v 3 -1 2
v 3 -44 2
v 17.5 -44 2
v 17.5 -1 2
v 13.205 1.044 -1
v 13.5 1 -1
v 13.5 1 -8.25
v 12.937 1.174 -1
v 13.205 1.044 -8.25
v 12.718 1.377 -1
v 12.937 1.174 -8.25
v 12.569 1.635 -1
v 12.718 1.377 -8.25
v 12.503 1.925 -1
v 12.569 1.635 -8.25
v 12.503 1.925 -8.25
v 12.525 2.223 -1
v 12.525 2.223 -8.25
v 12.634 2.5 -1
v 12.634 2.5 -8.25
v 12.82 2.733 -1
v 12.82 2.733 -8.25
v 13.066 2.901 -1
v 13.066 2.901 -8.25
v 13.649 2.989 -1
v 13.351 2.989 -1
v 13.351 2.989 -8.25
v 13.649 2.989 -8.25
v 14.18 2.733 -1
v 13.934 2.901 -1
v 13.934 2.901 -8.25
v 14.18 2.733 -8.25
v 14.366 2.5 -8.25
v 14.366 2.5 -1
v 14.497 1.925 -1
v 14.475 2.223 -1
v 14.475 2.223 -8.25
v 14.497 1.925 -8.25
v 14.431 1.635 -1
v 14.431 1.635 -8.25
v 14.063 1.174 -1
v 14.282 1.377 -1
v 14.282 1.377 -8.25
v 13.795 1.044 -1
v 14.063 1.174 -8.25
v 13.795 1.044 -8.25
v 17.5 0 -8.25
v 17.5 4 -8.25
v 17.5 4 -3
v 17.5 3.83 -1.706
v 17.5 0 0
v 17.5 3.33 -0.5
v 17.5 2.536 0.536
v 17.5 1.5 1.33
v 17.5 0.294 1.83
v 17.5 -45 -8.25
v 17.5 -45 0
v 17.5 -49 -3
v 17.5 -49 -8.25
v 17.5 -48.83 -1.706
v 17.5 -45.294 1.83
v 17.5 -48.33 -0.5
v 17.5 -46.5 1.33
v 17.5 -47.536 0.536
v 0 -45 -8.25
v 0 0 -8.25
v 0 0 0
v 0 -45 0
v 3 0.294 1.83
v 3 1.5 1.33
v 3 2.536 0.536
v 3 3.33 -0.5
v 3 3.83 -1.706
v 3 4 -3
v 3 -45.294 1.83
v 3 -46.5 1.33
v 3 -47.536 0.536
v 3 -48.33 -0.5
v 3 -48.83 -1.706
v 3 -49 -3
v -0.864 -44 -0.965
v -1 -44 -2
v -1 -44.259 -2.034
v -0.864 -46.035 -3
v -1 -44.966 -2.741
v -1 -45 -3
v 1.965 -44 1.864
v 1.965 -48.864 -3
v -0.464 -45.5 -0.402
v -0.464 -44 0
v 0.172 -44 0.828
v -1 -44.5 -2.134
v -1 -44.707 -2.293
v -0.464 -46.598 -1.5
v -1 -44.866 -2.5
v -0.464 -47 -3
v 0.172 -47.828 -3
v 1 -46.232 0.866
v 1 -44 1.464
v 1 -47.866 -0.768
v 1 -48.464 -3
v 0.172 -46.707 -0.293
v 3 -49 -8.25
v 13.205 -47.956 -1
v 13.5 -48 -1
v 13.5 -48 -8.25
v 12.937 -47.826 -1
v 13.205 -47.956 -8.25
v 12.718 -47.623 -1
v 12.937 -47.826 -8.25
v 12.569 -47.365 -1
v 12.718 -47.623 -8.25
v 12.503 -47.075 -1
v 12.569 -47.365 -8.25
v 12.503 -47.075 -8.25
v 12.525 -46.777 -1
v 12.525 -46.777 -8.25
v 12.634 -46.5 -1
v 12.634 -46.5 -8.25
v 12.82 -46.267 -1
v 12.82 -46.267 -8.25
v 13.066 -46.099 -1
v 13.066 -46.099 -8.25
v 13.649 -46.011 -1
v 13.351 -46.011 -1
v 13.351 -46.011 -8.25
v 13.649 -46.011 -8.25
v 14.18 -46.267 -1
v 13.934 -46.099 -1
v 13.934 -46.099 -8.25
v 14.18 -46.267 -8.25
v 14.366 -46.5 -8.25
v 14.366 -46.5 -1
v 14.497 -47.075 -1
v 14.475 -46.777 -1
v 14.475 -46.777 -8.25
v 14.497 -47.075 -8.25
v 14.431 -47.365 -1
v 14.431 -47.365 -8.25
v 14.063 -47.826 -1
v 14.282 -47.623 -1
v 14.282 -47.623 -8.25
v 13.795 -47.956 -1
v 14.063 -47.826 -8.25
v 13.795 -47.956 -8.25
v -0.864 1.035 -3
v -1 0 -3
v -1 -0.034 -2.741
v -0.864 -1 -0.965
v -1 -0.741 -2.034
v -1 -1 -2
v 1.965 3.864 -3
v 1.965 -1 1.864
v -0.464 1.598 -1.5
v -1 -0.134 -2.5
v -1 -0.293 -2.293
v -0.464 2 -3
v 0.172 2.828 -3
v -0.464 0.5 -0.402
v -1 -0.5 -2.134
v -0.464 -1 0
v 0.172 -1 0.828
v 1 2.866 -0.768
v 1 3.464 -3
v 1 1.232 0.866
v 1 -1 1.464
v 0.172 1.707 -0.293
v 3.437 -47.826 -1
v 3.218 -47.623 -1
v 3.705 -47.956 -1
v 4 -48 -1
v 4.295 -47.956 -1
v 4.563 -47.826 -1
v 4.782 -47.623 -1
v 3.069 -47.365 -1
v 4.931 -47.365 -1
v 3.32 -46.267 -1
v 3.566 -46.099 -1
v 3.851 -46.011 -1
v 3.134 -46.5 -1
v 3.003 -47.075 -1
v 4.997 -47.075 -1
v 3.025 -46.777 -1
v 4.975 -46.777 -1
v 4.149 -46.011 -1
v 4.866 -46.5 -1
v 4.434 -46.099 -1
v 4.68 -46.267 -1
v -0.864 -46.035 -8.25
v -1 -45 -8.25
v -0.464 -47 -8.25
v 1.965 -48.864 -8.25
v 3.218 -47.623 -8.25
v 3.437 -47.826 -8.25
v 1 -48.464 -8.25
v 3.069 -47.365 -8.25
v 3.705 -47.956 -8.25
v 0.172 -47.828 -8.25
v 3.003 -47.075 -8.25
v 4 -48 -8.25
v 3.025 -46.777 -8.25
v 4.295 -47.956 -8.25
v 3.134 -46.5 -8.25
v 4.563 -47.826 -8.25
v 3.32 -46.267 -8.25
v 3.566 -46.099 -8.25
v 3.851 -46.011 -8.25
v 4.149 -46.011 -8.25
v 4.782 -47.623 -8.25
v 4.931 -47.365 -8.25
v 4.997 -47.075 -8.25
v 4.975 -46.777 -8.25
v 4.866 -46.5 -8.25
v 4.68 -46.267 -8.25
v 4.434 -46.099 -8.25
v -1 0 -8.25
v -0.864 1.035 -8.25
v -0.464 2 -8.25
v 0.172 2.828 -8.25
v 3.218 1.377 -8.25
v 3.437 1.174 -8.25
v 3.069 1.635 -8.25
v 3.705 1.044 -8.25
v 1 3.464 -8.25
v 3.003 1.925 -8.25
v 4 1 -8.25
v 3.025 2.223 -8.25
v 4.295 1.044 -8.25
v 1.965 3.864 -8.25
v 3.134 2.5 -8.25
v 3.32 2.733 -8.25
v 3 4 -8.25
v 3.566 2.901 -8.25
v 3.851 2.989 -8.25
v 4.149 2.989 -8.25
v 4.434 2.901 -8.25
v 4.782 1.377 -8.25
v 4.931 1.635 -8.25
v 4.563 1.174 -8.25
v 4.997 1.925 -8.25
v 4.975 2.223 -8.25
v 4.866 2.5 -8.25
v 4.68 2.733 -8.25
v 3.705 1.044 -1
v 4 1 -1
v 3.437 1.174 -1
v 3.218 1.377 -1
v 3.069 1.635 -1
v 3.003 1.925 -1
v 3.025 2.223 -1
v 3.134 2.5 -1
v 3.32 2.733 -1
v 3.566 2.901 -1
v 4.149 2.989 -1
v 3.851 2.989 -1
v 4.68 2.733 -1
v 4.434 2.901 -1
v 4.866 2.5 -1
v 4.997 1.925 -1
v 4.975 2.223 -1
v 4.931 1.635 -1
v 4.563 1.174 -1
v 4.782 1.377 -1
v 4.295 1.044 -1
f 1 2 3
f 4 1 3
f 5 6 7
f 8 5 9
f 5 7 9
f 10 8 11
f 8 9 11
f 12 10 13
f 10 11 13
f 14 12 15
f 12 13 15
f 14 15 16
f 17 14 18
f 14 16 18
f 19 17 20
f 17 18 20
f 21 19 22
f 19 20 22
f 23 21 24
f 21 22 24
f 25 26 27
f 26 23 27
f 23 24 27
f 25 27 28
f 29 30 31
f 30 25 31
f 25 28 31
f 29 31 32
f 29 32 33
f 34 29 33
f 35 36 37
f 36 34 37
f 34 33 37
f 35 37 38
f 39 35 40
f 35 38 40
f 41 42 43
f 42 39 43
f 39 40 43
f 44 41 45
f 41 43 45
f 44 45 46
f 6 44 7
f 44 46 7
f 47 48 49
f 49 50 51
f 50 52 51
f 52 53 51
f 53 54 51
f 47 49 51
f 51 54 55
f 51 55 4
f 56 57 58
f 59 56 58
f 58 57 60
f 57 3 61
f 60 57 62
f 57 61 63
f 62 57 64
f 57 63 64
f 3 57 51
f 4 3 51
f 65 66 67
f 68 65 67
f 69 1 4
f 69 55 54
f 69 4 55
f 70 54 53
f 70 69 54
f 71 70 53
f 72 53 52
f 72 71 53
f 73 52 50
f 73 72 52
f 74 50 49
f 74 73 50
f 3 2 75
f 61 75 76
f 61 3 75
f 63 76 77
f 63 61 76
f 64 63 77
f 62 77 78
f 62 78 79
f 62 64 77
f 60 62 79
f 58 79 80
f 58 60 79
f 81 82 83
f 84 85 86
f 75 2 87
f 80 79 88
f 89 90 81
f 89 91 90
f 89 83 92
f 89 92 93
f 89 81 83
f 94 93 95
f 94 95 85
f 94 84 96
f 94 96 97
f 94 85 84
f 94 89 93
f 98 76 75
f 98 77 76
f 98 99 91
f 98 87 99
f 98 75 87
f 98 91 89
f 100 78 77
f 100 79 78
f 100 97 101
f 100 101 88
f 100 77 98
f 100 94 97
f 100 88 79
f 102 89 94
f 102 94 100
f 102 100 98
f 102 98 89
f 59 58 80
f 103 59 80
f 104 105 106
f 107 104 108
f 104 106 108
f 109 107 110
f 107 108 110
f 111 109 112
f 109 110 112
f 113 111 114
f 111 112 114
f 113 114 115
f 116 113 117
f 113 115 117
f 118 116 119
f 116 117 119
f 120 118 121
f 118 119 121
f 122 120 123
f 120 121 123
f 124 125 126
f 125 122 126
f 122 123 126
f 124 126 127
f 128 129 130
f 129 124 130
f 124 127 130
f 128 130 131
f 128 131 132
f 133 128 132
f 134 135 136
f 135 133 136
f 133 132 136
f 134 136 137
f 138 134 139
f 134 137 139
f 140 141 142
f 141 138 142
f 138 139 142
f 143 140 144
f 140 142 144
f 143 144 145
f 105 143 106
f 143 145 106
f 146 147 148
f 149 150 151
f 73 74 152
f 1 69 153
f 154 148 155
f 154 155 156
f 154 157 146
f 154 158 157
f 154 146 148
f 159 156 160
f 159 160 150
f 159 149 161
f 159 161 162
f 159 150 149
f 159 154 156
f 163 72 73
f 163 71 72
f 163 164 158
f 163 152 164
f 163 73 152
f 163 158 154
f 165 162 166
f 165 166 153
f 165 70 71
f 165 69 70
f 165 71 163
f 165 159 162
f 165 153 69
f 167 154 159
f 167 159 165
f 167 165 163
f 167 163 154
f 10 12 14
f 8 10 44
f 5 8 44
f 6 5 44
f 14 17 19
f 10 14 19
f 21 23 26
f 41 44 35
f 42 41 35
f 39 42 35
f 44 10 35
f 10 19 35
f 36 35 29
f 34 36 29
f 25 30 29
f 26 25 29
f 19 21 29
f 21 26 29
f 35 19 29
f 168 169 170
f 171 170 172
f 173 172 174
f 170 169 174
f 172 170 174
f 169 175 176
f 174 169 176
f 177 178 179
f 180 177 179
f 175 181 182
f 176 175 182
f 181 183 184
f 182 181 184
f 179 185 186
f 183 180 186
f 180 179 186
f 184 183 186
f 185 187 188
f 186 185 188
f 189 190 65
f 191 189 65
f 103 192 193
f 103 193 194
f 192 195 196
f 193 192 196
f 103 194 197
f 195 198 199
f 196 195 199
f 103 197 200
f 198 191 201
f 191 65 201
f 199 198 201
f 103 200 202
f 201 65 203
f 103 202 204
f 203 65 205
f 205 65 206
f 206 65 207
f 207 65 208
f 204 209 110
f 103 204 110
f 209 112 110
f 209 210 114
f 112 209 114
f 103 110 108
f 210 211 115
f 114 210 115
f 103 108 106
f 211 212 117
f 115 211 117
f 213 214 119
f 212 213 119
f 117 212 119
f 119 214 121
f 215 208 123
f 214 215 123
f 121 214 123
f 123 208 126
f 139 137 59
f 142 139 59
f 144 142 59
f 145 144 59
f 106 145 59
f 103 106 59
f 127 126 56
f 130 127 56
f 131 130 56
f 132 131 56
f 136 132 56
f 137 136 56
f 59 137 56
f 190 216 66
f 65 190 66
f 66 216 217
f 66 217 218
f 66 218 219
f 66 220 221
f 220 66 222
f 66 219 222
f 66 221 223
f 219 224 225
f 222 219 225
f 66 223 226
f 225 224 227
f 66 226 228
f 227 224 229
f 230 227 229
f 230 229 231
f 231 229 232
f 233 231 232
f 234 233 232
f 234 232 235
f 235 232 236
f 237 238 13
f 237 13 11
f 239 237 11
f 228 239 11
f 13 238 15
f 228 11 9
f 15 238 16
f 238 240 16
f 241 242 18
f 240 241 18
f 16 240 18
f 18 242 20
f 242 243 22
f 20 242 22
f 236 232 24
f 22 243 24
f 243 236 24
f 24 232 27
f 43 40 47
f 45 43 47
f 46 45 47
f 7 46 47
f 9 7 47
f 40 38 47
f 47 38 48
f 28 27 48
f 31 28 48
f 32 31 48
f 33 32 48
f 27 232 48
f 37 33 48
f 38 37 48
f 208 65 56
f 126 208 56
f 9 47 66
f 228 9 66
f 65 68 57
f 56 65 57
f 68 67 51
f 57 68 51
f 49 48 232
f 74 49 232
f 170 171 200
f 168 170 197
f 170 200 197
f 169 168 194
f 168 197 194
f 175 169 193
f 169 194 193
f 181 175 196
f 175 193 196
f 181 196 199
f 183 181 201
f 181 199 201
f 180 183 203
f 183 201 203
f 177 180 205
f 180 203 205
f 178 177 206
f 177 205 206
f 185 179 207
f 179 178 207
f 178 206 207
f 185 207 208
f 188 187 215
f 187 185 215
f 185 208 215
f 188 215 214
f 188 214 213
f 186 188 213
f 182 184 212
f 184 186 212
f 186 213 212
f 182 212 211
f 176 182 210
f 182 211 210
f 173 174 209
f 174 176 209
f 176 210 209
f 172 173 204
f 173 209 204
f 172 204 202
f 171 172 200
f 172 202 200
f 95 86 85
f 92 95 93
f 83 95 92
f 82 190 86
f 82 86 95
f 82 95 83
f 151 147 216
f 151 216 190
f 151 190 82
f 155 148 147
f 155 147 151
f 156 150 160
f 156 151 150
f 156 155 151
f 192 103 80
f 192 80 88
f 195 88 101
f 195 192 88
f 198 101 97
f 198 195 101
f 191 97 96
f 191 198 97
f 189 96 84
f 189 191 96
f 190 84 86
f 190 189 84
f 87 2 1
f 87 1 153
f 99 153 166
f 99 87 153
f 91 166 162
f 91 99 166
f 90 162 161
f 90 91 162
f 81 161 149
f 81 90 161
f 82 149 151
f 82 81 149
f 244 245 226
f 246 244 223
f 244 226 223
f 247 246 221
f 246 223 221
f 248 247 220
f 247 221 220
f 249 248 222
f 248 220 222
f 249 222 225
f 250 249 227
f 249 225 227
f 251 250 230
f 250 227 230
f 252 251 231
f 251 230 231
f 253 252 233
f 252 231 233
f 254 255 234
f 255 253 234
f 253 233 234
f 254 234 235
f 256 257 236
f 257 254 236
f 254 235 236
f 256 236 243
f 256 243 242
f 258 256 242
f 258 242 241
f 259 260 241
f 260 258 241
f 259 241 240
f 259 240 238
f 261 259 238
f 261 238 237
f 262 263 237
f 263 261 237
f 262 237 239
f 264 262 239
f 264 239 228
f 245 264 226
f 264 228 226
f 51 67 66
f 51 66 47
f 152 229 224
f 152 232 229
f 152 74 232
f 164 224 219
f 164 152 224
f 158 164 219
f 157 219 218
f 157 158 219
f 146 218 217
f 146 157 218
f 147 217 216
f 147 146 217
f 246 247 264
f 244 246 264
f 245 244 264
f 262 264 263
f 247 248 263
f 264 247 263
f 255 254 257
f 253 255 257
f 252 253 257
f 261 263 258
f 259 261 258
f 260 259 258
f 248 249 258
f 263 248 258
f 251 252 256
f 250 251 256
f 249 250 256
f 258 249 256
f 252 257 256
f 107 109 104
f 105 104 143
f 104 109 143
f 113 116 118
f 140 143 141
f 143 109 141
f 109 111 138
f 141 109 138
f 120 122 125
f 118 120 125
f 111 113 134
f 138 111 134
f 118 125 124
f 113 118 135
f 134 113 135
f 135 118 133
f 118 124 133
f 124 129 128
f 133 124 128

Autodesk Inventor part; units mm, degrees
ref_plane "YZ Plane" through (0, 0, 0) normal (1, 0, 0) x (0, 1, 0)
ref_plane "XZ Plane" through (0, 0, 0) normal (0, 1, 0) x (-1, 0, 0)
sketch "Szkic1" plane through (0, 0, 0) normal (0, 0, 1) x (1, 0, 0)
  line L0 (13.65, -45) -> (17, -45) projected
  line L1 (0.5, -45) -> (12.85, -45) projected
  line L2 (17, -25) -> (13.65, -25) projected
  line L3 (12.85, -25) -> (0.5, -25) projected
  line L4 (13.65, -20) -> (17, -20) projected
  line L5 (0.5, -20) -> (12.85, -20) projected
  line L6 (12.85, 0) -> (0.5, 0) projected
  line L7 (17, 0) -> (13.65, 0) projected
  line L8 (0, -25.5) -> (0, -44.5) projected
  line L9 (0, -0.5) -> (0, -19.5) projected
  line L10 (17.5, -12.6805) -> (17.5, -0.5) projected
  line L11 (17.5, -44.5) -> (17.5, -32.3195) projected
  line L12 (0, -45) -> (17.5, -45)
  line L13 (17.5, -45) -> (17.5, -49)
  line L14 (17.5, -49) -> (0, -49)
  line L15 (0, -49) -> (0, -45)
  line L16 (0, -20) -> (17.5, -20)
  line L17 (17.5, -20) -> (17.5, -25)
  line L18 (17.5, -25) -> (0, -25)
  line L19 (0, -25) -> (0, -20)
  line L20 (0, 0) -> (17.5, 0)
  line L21 (17.5, 0) -> (17.5, 4)
  line L22 (17.5, 4) -> (0, 4)
  line L23 (0, 4) -> (0, 0)
  line L24 (0, 4) -> (17.5, 4)
  line L25 (17.5, 4) -> (17.5, -49)
  line L26 (17.5, -49) -> (0, -49)
  line L27 (0, -49) -> (0, 4)
  dimension "d0" = 4
  dimension "d1" = 4
ref_plane "Płaszczyzna konstrukcyjna1" through (-42.5, -72.5, -8.25) normal (0, 0, 1) x (1, 0, 0)
extrude "Wyciągnięcie proste1" add sketch "Szkic1" against normal up to surface (8.25 mm away) contours L0 L12 L13 L14 L15 L1 | L18 L2 L3 L19 L16 L5 L4 L17 | L20 L7 L6 L23 L22 L21
sketch "Szkic2" plane through (0, 0, 0) normal (0, 0, 1) x (1, 0, 0)
  line L0 (0, 0) -> (17.5, 0) projected
  line L1 (17.5, 0) -> (17.5, 4) projected
  line L2 (17.5, 4) -> (0, 4) projected
  line L3 (0, 4) -> (0, 0) projected
  line L4 (0, -25) -> (17.5, -25) projected
  line L5 (17.5, -25) -> (17.5, -20) projected
  line L6 (17.5, -20) -> (0, -20) projected
  line L7 (0, -20) -> (0, -25) projected
  line L8 (0, -49) -> (17.5, -49) projected
  line L9 (17.5, -49) -> (17.5, -45) projected
  line L10 (17.5, -45) -> (0, -45) projected
  line L11 (0, -45) -> (0, -49) projected
  line L12 (0, 4) -> (17.5, 4) projected
  line L13 (17.5, 4) -> (0, 4)
  line L14 (0, 4) -> (0, -49)
  line L15 (0, -49) -> (17.5, -49)
  line L16 (17.5, -49) -> (17.5, 4)
extrude "Wyciągnięcie proste2" add sketch "Szkic2" along normal blind 2
sketch "Szkic3" plane through (0, 0, 2) normal (0, 0, 1) x (1, 0, 0)
  line L0 (17.5, -45) -> (0, -45) projected
  line L1 (0, 4) -> (0, -49) projected
  line L2 (0, -49) -> (17.5, -49) projected
  line L3 (17.5, -49) -> (17.5, 4) projected
  line L4 (0, -25) -> (17.5, -25) projected
  line L5 (17.5, -20) -> (0, -20) projected
  line L6 (0, 0) -> (17.5, 0) projected
  line L7 (17.5, 4) -> (0, 4) projected
  point P0 (13.5, -47)
  point P1 (4, -47)
  point P2 (13.5, -22.5)
  point P3 (4, -22.5)
  point P4 (13.5, 2)
  point P5 (4, 2)
  dimension "d6" = 2
  dimension "d7" = 2
  dimension "d8" = 2.5
  dimension "d9" = 2.5
  dimension "d10" = 2
  dimension "d11" = 2
  dimension "d12" = 4
  dimension "d13" = 4
  dimension "d14" = 4
  dimension "d15" = 4
  dimension "d16" = 4
  dimension "d17" = 4
hole "Otwór1" at (13.5, -47, 2) at (4, -47, 2) at (13.5, -22.5, 2) at (4, -22.5, 2) at (13.5, 2, 2) at (4, 2, 2) direction (0, 0, -1) diameter 2 end through all
sketch "Szkic4" plane through (0, 0, 2) normal (0, 0, 1) x (1, 0, 0)
  circle A0 centre (13.5, 2) radius 1 projected
  circle A1 centre (13.5, -22.5) radius 1 projected
  circle A2 centre (13.5, -47) radius 1 projected
  circle A3 centre (4, -47) radius 1 projected
  circle A4 centre (4, -22.5) radius 1 projected
  circle A5 centre (4, 2) radius 1 projected
  line L0 (17.5, -49) -> (17.5, 4) projected
  line L1 (17.5, 4) -> (0, 4) projected
  line L2 (0, 4) -> (0, -49) projected
  line L3 (0, -49) -> (17.5, -49) projected
  point P0 (0, 0)
extrude "Wyciągnięcie proste3" add sketch "Szkic4" against normal blind 3 contours A0 | A1 | A2 | A3 | A4 | A5
fillet "Zaokrąglenie1" radius 5 2 edges at (8.75, 4, 2) (8.75, -49, 2)
sketch "Szkic5" plane through (0, -25, -8.25) normal (-1, 0, 0) x (0, 0, 1)
  arc A0 (5.25, -24) -> (10.25, -19) centre (5.25, -19) ccw projected
  line L0 (10.25, 24) -> (10.25, -19) projected
  arc A1 (10.25, 24) -> (5.25, 29) centre (5.25, 24) ccw projected
  line L1 (0, 29) -> (5.25, 29) projected
  line L2 (0, 25) -> (0, 29) projected
  line L3 (8.25, 25) -> (0, 25) projected
  line L4 (8.25, 25) -> (8.25, 5) projected
  line L5 (8.25, 5) -> (0, 5) projected
  line L6 (0, 0) -> (0, 5) projected
  line L7 (8.25, 0) -> (0, 0) projected
  line L8 (8.25, 0) -> (8.25, -20) projected
  line L9 (8.25, -20) -> (0, -20) projected
  line L10 (0, -24) -> (0, -20) projected
  line L11 (5.25, -24) -> (0, -24) projected
  line L12 (0, 25) -> (0, -20)
extrude "Wyciągnięcie proste4" add sketch "Szkic5" along normal blind 1
fillet "Zaokrąglenie2" radius 4 5 edges at (-1, 4, -5.625) (-1, -22.5, 2) (-1, -47.5355, 0.5355) (-1, -49, -5.625) (-1, 2.5355, 0.5355)
sketch "Szkic6" plane through (17.5, -25, -8.25) normal (0, 0, -1) x (-1, 0, 0)
  circle A0 centre (13.5, -22) radius 1 projected
  circle A1 centre (4, -22) radius 1 projected
  circle A2 centre (13.5, 27) radius 1 projected
  circle A3 centre (4, 27) radius 1 projected
  circle A4 centre (4, 2.5) radius 1 projected
  circle A5 centre (13.5, 2.5) radius 1 projected
  arc A6 (18.5, 25) -> (14.5, 29) centre (14.5, 25) ccw projected
  line L0 (14.5, 29) -> (0, 29) projected
  line L1 (0, 29) -> (0, 25) projected
  line L2 (0, 25) -> (17.5, 25) projected
  line L3 (17.5, 25) -> (17.5, 5) projected
  line L4 (17.5, 5) -> (0, 5) projected
  line L5 (0, 5) -> (0, 0) projected
  line L6 (0, 0) -> (17.5, 0) projected
  line L7 (17.5, 0) -> (17.5, -20) projected
  line L8 (17.5, -20) -> (0, -20) projected
  line L9 (0, -20) -> (0, -24) projected
  line L10 (0, -24) -> (14.5, -24) projected
  arc A7 (14.5, -24) -> (18.5, -20) centre (14.5, -20) ccw projected
  line L11 (18.5, 25) -> (18.5, -20) projected
  line L12 (17.5, 0) -> (0, 0) projected
  line L13 (0, 5) -> (17.5, 5)
  line L14 (17.5, 5) -> (17.5, 0)
  line L15 (17.5, 0) -> (0, 0)
  line L16 (0, 0) -> (0, 5)
extrude "Wyciągnięcie proste5" cut sketch "Szkic6" against normal up to surface (8.25 mm away) contours A4 | A5 | L14 L6 L5 L4
properties part number "uchwyt_serw"
